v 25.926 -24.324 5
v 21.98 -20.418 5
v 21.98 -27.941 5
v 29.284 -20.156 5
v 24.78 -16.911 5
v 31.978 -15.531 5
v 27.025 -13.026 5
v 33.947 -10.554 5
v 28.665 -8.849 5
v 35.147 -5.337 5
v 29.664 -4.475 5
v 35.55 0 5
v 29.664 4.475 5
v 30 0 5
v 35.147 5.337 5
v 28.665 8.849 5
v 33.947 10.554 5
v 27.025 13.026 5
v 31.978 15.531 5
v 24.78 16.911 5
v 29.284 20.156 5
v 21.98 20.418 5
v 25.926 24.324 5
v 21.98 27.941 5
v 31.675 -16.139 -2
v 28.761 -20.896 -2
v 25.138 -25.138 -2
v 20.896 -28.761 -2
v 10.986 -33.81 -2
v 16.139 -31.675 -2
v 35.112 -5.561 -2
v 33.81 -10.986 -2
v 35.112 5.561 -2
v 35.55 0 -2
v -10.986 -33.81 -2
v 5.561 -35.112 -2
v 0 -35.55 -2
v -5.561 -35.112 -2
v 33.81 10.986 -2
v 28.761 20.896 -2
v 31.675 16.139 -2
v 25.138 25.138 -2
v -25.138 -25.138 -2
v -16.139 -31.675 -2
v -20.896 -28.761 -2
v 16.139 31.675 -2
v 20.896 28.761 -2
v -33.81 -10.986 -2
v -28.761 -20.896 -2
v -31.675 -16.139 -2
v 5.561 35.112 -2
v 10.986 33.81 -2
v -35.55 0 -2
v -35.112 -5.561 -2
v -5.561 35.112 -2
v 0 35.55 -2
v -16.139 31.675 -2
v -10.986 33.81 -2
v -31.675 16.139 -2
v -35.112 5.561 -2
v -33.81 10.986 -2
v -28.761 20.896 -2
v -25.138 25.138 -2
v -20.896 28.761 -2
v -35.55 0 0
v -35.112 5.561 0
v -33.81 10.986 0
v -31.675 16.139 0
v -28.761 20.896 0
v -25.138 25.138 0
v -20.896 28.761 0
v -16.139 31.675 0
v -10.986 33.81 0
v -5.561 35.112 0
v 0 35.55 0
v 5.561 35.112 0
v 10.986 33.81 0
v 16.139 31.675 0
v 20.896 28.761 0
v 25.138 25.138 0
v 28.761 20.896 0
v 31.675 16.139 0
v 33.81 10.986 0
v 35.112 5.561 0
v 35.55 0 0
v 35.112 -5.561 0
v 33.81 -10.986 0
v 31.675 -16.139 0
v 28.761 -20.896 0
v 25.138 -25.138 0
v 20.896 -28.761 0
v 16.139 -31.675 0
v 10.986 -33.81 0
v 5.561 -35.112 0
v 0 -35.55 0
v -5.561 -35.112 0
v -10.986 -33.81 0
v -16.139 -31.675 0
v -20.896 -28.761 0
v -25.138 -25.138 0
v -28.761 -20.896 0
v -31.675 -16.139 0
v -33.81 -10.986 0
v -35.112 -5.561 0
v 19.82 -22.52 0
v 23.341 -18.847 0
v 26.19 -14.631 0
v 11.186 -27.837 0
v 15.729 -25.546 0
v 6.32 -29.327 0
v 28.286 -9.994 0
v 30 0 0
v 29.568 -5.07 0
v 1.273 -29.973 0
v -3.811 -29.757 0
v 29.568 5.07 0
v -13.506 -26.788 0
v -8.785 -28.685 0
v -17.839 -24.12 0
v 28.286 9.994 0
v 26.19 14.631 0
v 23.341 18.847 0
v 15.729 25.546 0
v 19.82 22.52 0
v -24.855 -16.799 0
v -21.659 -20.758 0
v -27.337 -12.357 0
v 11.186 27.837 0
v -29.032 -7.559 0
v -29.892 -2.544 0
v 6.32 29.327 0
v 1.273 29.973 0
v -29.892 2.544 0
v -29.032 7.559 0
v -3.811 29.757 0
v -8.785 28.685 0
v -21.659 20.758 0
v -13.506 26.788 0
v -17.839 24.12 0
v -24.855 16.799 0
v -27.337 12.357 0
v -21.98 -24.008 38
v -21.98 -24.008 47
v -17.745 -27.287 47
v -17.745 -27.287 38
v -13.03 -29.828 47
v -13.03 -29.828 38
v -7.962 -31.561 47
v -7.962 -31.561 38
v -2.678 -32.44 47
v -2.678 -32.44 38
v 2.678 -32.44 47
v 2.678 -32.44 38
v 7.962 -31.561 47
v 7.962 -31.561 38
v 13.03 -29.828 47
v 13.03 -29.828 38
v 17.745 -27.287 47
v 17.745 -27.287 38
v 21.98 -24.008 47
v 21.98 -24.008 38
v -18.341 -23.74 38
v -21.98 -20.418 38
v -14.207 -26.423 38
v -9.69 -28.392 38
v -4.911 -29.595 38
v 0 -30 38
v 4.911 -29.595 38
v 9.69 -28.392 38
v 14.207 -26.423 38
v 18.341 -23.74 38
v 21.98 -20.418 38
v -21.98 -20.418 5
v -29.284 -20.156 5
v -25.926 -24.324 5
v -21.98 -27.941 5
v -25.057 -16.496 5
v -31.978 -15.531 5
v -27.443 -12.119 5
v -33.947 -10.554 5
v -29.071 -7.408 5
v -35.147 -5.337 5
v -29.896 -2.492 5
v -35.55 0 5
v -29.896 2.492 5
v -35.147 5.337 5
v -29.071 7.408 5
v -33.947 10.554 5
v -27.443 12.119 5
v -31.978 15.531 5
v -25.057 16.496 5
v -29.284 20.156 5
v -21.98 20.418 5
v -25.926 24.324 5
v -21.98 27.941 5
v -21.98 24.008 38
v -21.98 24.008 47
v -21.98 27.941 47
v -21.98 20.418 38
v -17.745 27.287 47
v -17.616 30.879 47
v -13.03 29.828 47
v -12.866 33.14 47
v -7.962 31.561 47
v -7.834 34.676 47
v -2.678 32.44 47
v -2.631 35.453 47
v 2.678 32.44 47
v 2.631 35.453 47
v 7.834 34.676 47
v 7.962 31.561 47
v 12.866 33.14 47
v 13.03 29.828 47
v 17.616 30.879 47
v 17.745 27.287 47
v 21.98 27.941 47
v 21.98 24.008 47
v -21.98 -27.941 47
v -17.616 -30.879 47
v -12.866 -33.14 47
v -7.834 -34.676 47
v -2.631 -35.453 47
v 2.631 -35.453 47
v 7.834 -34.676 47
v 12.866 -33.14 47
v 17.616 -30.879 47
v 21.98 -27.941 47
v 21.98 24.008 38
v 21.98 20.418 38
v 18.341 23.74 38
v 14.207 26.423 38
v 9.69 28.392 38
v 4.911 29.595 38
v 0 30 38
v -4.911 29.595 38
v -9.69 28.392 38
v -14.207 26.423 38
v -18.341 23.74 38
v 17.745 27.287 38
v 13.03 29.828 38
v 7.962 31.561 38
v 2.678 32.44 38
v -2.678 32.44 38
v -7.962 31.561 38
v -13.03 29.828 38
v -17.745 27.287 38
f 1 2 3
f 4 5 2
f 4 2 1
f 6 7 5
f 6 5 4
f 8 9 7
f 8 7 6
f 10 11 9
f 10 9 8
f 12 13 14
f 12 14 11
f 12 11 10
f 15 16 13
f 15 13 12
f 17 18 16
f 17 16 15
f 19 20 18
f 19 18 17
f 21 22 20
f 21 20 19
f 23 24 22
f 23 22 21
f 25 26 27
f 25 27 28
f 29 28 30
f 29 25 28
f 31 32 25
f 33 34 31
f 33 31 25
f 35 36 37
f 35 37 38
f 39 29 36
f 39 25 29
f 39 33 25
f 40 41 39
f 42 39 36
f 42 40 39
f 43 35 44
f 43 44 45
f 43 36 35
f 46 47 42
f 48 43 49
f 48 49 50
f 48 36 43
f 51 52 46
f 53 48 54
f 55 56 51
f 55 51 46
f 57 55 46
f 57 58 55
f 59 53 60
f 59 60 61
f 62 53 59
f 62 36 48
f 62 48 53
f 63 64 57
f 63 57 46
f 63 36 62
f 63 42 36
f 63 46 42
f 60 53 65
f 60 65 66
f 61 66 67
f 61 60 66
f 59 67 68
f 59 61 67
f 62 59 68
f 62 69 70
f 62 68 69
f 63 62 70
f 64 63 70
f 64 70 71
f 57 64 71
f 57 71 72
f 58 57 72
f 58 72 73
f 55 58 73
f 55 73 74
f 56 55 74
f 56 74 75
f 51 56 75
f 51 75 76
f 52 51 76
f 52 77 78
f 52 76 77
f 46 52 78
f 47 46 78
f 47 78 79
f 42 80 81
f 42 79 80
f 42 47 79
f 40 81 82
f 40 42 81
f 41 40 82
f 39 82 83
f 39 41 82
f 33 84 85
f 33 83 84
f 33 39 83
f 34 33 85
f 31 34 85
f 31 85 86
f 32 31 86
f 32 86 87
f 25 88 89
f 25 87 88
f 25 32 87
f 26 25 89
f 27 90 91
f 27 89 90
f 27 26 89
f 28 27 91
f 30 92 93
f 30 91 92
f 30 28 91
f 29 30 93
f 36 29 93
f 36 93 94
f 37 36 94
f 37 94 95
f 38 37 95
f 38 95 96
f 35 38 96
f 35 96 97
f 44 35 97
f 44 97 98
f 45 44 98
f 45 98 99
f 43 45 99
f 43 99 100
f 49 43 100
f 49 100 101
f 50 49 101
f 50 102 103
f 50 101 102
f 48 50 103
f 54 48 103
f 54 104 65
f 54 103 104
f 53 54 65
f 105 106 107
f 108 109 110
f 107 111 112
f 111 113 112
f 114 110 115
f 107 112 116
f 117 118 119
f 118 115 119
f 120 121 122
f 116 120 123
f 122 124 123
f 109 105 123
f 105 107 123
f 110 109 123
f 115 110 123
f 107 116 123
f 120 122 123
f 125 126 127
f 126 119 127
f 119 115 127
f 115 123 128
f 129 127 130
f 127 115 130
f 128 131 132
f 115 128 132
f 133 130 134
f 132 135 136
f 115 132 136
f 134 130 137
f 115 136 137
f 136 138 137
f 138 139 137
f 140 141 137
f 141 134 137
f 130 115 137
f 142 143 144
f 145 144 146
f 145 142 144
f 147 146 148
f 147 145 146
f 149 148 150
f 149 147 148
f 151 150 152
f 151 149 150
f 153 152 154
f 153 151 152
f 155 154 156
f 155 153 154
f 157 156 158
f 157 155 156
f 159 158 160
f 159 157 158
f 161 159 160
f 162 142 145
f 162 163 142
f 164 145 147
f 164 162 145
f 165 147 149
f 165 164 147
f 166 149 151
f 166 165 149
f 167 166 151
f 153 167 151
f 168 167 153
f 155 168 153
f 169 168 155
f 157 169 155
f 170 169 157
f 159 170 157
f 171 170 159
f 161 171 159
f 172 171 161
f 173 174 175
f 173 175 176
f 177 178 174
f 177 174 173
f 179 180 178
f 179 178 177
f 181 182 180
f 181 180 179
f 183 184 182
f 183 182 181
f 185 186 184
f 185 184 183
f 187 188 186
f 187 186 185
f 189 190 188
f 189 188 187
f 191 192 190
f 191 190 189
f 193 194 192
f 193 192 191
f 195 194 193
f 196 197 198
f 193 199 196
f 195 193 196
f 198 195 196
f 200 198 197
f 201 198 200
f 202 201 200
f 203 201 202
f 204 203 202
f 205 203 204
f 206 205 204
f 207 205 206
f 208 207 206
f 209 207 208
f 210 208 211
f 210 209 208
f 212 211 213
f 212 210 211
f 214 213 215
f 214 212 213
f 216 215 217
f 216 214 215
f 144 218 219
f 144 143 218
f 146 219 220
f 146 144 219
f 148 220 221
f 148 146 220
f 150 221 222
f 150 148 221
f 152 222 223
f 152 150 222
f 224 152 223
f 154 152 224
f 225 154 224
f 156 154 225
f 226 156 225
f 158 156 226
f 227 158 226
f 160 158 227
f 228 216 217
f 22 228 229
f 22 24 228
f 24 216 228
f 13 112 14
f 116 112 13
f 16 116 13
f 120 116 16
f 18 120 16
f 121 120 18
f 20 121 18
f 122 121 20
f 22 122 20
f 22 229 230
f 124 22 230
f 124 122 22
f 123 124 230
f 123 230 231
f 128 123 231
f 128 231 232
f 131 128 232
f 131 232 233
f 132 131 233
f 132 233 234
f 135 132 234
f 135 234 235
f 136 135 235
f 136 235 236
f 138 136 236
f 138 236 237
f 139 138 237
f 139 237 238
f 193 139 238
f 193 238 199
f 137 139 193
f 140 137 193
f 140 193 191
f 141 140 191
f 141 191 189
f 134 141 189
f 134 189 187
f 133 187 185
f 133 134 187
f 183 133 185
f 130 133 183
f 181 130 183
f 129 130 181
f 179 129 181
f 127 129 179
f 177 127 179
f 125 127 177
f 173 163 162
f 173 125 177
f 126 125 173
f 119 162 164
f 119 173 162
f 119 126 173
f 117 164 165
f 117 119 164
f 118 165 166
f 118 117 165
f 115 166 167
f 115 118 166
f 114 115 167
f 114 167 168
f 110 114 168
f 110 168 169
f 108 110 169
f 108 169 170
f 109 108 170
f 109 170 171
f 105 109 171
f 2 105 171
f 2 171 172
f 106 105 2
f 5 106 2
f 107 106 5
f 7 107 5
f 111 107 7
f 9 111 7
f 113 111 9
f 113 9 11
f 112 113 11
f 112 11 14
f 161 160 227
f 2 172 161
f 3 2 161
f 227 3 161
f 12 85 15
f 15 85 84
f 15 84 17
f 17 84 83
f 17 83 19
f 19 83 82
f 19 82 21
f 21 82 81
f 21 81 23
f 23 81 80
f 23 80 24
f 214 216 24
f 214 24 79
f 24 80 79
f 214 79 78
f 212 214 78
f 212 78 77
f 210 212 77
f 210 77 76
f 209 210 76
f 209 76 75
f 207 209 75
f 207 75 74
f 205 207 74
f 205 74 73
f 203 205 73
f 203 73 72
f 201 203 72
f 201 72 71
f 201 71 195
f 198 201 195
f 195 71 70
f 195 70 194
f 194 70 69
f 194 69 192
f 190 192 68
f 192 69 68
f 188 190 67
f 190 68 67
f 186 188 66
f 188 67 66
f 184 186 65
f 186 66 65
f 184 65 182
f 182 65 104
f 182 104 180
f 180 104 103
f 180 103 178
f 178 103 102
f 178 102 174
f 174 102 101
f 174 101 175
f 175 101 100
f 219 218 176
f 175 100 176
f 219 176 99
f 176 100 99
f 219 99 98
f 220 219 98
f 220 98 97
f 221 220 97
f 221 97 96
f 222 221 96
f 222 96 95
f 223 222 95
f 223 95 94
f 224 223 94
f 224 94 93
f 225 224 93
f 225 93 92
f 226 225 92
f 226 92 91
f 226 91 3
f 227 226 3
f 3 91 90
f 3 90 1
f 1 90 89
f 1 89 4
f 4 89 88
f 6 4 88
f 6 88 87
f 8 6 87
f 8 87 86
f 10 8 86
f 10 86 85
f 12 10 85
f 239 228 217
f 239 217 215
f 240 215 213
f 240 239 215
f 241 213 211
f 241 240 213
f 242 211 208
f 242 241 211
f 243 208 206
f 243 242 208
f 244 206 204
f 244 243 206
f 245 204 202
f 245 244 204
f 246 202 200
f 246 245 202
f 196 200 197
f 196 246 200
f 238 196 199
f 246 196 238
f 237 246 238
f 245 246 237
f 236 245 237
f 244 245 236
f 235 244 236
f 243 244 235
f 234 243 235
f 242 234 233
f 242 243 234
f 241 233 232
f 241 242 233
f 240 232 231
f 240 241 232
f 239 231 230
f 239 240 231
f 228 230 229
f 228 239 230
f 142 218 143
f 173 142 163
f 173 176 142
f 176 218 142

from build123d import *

# Parameters (mm, degrees)
SKETCH1_R           = 35.55
SKETCH1_R_2         = 32.55
BOSS_EXTRUDE1_DEPTH = 47
BOSS_EXTRUDE2_START = 2
SKETCH2_R           = 35.55
BOSS_EXTRUDE2_DEPTH = 2
SKETCH4_R           = 32.55
SKETCH4_R_2         = 30
BOSS_EXTRUDE3_DEPTH = 38
CUT_EXTRUDE1_START  = -42
CUT_EXTRUDE1_DEPTH  = 42


with BuildPart() as part:
    # Sketch1 → Boss-Extrude1 (new body)
    with BuildSketch(Plane.XY):
        Circle(SKETCH1_R)
        Circle(SKETCH1_R_2, mode=Mode.SUBTRACT)
    extrude(amount=BOSS_EXTRUDE1_DEPTH)

    # Sketch2 → Boss-Extrude2 (add)
    with BuildSketch(Plane(origin=(0, 0, 0), x_dir=(-1, 0, 0), z_dir=(0, 0, -1)).offset(BOSS_EXTRUDE2_START)):
        Circle(SKETCH2_R)
    extrude(amount=-BOSS_EXTRUDE2_DEPTH)

    # Sketch4 → Boss-Extrude3 (add)
    with BuildSketch(Plane.XY):
        Circle(SKETCH4_R)
        Circle(SKETCH4_R_2, mode=Mode.SUBTRACT)
    extrude(amount=BOSS_EXTRUDE3_DEPTH)

    # Sketch5 → Cut-Extrude1 (cut)
    with BuildSketch(Plane.XY.offset(47).offset(CUT_EXTRUDE1_START)):
        with BuildLine():
            Line((-35.55, 35.55), (-35.55, -3.6e-08))
            ThreePointArc((-35.55, -3.6e-08), (-31.978075564, 15.530781797), (-21.980088117, 27.940619649))
            Line((-21.980088117, 27.940619649), (-21.980088117, 35.55))
            Line((-21.980088117, 35.55), (-35.55, 35.55))
        make_face()
        with BuildLine():
            ThreePointArc((-21.980088117, 27.940619649), (-31.978075564, 15.530781797), (-35.55, -3.6e-08))
            ThreePointArc((-35.55, -3.6e-08), (-31.978075549, -15.530781829), (-21.980088117, -27.940619649))
            Line((-21.980088117, -27.940619649), (-21.980088117, -24.007878423))
            ThreePointArc((-21.980088117, -24.007878423), (-32.55, 0), (-21.980088117, 24.007878423))
            Line((-21.980088117, 24.007878423), (-21.980088117, 27.940619649))
        make_face()
        with BuildLine():
            ThreePointArc((-21.980088117, 24.007878423), (-32.55, 0), (-21.980088117, -24.007878423))
            Line((-21.980088117, -24.007878423), (-21.980088117, 24.007878423))
        make_face()
        with BuildLine():
            Line((-35.55, -3.6e-08), (-35.55, -35.55))
            Line((-35.55, -35.55), (-21.980088117, -35.55))
            Line((-21.980088117, -35.55), (-21.980088117, -27.940619649))
            ThreePointArc((-21.980088117, -27.940619649), (-31.978075549, -15.530781829), (-35.55, -3.6e-08))
        make_face()
        with BuildLine():
            Line((21.980088117, -27.940619649), (21.980088117, -35.55))
            Line((21.980088117, -35.55), (35.55, -35.55))
            Line((35.55, -35.55), (35.55, 0))
            ThreePointArc((35.55, 0), (31.978075556, -15.530781813), (21.980088117, -27.940619649))
        make_face()
        with BuildLine():
            Line((21.980088117, -24.007878423), (21.980088117, -27.940619649))
            ThreePointArc((21.980088117, -27.940619649), (31.978075556, -15.530781813), (35.55, 0))
            ThreePointArc((35.55, 0), (31.978075556, 15.530781813), (21.980088117, 27.940619649))
            Line((21.980088117, 27.940619649), (21.980088117, 24.007878423))
            ThreePointArc((21.980088117, 24.007878423), (29.790555284, 13.115842172), (32.55, 0))
            ThreePointArc((32.55, 0), (29.790555284, -13.115842172), (21.980088117, -24.007878423))
        make_face()
        with BuildLine():
            Line((21.980088117, 24.007878423), (21.980088117, -24.007878423))
            ThreePointArc((21.980088117, -24.007878423), (29.790555284, -13.115842172), (32.55, 0))
            ThreePointArc((32.55, 0), (29.790555284, 13.115842172), (21.980088117, 24.007878423))
        make_face()
        with BuildLine():
            ThreePointArc((21.980088117, 27.940619649), (31.978075556, 15.530781813), (35.55, 0))
            Line((35.55, 0), (35.55, 35.55))
            Line((35.55, 35.55), (21.980088117, 35.55))
            Line((21.980088117, 35.55), (21.980088117, 27.940619649))
        make_face()
    extrude(amount=CUT_EXTRUDE1_DEPTH, mode=Mode.SUBTRACT)


solid = part.part
